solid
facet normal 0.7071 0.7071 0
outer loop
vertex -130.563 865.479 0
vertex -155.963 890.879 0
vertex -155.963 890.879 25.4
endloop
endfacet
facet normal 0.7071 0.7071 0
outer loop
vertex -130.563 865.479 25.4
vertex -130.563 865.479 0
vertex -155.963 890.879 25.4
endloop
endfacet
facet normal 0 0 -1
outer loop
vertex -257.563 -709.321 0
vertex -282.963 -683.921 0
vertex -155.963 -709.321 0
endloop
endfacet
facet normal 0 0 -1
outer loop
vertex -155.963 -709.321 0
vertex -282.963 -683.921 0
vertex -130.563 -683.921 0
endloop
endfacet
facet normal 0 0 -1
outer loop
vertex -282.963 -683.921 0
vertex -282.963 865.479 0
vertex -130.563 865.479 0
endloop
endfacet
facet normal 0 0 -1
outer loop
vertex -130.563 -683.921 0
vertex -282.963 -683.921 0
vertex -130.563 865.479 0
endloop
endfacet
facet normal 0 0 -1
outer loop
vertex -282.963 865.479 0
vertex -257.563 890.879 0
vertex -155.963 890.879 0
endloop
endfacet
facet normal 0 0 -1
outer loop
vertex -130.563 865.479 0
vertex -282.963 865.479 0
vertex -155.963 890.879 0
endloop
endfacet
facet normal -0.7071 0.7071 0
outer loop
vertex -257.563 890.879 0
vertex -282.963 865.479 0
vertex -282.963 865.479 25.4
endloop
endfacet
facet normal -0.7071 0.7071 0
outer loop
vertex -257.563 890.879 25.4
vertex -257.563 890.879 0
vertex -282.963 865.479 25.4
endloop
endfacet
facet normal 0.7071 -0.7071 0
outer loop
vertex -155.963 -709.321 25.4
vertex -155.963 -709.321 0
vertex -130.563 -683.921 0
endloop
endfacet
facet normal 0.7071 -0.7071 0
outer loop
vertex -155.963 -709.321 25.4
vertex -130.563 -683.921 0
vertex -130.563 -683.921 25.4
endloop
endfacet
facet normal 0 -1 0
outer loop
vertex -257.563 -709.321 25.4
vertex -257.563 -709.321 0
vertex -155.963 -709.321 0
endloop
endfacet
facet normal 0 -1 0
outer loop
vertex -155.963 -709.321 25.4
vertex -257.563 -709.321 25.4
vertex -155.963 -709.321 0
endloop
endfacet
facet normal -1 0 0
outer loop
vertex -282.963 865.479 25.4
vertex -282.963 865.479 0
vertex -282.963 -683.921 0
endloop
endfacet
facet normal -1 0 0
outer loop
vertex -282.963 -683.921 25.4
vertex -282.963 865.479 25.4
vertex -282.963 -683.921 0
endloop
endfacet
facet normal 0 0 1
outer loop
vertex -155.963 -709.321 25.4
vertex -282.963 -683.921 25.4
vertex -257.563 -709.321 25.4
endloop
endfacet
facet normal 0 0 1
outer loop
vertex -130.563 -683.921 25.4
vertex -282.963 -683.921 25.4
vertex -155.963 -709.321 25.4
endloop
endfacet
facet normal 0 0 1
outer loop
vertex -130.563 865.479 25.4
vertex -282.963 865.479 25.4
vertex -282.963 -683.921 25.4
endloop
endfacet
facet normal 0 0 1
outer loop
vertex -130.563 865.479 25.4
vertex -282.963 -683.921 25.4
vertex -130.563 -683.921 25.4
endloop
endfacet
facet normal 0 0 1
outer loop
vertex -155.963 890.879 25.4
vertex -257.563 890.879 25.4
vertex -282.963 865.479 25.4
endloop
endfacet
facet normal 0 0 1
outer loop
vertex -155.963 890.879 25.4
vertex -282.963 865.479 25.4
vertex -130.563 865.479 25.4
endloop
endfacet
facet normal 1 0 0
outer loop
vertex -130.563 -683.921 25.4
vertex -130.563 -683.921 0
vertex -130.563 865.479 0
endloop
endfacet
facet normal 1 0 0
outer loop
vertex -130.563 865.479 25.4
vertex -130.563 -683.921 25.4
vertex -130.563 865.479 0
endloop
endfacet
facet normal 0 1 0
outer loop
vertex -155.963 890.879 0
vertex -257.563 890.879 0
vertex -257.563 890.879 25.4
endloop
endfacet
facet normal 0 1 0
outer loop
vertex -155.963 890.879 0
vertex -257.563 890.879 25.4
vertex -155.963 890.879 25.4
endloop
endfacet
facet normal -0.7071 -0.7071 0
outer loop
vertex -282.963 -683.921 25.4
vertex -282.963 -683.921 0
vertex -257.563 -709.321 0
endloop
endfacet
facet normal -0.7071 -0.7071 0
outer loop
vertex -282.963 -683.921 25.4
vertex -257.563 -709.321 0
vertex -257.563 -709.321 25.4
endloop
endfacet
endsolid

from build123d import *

# Parameters (mm, degrees)
F0_W     = 152.4
F0_H     = 1549.4
F0_H_2   = 25.4
F1_DEPTH = 25.4
F2_SIZE  = 25.4


with BuildPart() as f1:
    # F0 (on Top) → F1 (new body)
    with BuildSketch(Plane.XY):
        with Locations((-206.763415, 90.778879)):
            Rectangle(F0_W, F0_H)
        with Locations((-206.763415, -696.621121)):
            Rectangle(F0_W, F0_H_2)
        with Locations((-206.763415, 878.178879)):
            Rectangle(F0_W, F0_H_2)
    extrude(amount=F1_DEPTH)

    # F2
    f2_edges = [f1.edges().sort_by_distance(p)[0] for p in [
        (-130.563415, -709.321121, 12.7),
        (-282.963415, -709.321121, 12.7),
        (-130.563415, 890.878879, 12.7),
        (-282.963415, 890.878879, 12.7),
    ]]
    chamfer(f2_edges, length=F2_SIZE)


solid = f1.part
